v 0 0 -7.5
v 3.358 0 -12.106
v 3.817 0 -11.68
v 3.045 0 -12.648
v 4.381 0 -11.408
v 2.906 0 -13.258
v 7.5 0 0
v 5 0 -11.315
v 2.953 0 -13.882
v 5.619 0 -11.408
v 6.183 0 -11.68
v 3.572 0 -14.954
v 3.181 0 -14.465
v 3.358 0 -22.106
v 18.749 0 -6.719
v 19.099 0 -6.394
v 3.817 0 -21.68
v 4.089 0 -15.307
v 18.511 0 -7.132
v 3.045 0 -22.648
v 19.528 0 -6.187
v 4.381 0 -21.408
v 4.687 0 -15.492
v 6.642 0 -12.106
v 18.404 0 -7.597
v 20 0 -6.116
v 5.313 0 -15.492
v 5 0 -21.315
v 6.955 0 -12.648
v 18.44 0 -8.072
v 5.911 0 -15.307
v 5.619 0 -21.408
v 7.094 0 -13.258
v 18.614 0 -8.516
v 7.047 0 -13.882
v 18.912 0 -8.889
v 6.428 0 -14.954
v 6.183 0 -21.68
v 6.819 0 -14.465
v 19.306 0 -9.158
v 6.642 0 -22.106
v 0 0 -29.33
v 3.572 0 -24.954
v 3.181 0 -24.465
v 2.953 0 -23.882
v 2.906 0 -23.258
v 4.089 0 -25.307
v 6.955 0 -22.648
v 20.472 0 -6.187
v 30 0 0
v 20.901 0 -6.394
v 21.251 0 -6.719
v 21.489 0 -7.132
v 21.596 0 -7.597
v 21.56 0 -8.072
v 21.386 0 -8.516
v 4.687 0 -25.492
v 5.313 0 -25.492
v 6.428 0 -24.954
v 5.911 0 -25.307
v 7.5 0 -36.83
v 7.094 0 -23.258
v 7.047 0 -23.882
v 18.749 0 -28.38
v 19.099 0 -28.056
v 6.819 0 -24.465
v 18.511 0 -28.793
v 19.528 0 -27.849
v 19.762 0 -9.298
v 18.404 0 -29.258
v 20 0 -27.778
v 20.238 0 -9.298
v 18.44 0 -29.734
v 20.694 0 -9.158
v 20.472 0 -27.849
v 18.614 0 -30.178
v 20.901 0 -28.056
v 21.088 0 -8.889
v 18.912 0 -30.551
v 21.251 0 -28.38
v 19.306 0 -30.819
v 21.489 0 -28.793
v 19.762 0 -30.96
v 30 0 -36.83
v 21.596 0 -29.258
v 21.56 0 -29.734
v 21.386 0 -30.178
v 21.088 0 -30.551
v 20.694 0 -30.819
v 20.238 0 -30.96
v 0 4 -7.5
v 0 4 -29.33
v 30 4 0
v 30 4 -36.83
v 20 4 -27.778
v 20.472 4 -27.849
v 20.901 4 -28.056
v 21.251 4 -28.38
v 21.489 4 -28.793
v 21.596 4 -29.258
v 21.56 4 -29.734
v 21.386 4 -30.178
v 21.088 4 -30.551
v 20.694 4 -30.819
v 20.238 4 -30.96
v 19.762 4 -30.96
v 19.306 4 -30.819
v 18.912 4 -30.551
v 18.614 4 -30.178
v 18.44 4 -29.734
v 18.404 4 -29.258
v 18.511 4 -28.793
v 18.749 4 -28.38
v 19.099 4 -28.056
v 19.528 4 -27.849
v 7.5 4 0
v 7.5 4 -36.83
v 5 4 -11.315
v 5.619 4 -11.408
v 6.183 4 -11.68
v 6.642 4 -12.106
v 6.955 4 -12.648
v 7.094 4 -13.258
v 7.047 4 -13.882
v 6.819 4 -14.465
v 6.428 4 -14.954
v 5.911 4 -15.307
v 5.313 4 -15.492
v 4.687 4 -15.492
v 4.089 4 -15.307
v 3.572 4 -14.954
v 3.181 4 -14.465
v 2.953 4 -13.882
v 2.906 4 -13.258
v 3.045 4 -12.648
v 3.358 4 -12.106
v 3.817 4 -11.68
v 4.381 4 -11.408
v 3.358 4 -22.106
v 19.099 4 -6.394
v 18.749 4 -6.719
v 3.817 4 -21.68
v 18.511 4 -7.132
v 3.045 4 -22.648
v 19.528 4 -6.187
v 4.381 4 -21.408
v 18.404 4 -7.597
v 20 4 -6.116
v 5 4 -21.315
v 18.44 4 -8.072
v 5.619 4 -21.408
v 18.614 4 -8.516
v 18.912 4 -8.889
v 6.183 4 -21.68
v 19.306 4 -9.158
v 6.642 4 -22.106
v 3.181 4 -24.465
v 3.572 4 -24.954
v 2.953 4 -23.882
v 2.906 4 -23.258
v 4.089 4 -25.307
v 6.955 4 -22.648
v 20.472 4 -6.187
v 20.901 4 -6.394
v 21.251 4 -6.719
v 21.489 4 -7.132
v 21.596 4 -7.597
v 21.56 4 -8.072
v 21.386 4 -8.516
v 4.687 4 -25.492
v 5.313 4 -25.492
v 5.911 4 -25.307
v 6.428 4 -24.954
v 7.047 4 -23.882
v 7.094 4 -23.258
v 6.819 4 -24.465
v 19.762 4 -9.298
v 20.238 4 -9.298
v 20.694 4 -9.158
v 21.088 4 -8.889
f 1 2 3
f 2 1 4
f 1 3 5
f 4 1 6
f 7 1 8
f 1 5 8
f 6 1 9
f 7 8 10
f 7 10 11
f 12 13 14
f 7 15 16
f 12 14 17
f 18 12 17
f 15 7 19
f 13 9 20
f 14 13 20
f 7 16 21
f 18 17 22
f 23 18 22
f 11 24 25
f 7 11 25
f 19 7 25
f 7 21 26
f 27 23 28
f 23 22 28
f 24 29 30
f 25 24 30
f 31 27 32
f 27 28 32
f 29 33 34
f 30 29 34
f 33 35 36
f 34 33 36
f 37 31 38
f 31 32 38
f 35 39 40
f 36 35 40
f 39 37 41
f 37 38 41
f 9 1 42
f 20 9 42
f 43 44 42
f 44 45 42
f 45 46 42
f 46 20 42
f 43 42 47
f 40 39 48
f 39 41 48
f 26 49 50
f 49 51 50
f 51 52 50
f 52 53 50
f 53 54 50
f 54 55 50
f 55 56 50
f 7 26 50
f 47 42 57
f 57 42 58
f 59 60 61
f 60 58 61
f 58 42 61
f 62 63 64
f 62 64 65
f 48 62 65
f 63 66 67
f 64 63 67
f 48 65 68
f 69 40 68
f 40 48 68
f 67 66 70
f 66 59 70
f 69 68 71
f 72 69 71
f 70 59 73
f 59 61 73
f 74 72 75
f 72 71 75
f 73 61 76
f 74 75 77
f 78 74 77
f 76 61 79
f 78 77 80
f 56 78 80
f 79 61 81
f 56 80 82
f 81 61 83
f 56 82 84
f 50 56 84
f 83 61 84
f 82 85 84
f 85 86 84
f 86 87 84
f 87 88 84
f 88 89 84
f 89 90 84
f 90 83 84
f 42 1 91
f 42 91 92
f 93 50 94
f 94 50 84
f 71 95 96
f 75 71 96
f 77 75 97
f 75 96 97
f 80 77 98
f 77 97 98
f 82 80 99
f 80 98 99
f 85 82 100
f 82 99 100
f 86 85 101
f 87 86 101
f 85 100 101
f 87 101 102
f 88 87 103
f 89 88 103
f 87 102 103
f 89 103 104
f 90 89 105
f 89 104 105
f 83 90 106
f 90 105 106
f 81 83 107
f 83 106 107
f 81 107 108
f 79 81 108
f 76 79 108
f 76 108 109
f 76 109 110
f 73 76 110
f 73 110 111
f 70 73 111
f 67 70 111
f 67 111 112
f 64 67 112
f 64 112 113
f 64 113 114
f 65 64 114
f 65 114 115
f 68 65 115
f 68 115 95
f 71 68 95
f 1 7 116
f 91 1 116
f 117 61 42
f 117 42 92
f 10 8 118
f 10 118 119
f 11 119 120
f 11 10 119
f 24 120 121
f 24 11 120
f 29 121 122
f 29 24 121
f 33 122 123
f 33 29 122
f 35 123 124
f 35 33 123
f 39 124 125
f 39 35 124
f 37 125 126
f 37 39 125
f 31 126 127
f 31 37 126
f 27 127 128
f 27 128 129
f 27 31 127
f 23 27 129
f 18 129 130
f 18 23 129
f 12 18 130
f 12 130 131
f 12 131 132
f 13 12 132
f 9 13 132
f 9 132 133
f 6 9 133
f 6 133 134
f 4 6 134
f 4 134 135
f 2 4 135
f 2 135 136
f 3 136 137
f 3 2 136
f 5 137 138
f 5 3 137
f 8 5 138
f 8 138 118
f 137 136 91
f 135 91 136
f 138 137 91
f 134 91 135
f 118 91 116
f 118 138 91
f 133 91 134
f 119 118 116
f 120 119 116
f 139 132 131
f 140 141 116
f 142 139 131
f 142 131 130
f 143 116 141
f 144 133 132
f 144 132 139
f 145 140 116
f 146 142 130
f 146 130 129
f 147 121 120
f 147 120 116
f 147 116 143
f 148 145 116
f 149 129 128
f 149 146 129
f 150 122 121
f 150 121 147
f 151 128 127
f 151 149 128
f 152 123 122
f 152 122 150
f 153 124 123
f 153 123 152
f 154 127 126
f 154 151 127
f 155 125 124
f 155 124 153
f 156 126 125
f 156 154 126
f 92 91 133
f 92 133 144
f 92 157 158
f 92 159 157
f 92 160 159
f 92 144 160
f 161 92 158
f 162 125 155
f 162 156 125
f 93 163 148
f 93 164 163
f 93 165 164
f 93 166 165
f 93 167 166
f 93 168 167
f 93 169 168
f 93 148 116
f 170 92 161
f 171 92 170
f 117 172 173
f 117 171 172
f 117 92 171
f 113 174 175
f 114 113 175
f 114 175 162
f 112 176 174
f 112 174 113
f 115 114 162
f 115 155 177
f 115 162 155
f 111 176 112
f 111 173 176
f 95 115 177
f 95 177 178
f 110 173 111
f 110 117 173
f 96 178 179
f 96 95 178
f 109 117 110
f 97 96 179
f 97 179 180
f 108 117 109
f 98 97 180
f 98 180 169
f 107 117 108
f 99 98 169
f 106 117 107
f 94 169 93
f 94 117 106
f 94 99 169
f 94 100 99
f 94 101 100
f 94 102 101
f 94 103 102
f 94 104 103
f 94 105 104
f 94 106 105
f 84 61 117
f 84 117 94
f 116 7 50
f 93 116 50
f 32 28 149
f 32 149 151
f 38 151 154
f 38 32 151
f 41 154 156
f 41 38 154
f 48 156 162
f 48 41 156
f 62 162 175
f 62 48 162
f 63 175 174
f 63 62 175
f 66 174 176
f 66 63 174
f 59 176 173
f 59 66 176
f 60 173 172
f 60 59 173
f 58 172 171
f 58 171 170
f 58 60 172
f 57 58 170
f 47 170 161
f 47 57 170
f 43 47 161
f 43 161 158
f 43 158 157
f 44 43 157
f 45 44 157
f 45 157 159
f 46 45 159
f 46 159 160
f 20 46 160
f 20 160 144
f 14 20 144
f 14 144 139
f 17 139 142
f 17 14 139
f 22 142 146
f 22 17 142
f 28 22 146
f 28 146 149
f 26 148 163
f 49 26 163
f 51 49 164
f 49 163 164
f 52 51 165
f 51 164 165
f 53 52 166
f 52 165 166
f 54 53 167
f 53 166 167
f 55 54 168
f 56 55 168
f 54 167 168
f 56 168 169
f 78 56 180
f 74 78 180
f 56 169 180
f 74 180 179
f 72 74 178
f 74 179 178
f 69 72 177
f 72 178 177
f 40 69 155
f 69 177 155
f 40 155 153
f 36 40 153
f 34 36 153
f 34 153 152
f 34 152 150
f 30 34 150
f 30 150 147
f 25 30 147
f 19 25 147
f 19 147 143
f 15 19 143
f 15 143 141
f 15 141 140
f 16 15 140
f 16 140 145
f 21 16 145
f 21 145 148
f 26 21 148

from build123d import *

# Parameters (mm, degrees)
SKETCH1_W           = 30
SKETCH1_H           = 36.83
SKETCH1_R           = 2.1
BOSS_EXTRUDE1_DEPTH = 4
CHAMFER1_SIZE       = 7.5
SKETCH2_R           = 1.6
CUT_EXTRUDE1_DEPTH  = 48.670209775


with BuildPart() as part:
    # Sketch1 → Boss-Extrude1 (new body)
    with BuildSketch(Plane(origin=(0, 0, 0), x_dir=(1, 0, 0), z_dir=(0, 1, 0))):
        with Locations((15, 18.415)):
            Rectangle(SKETCH1_W, SKETCH1_H)
        with Locations(Location((5, 23.415, 0), (0, 0, 270))):
            Circle(SKETCH1_R, mode=Mode.SUBTRACT)
        with Locations(Location((5, 13.415, 0), (0, 0, 270))):
            Circle(SKETCH1_R, mode=Mode.SUBTRACT)
    extrude(amount=BOSS_EXTRUDE1_DEPTH)

    # Chamfer1
    chamfer1_edges = [part.edges().sort_by_distance(p)[0] for p in [
        (0, 2, -36.83),
        (0, 2, 0),
    ]]
    chamfer(chamfer1_edges, length=CHAMFER1_SIZE)

    # Sketch2 → Cut-Extrude1 (cut, through all)
    with BuildSketch(Plane(origin=(0, 4, 0), x_dir=(1, 0, 0), z_dir=(0, 1, 0))):
        with Locations(Location((20, 29.377825135, 0), (0, 0, 270))):
            Circle(SKETCH2_R)
        with Locations(Location((20, 7.716339326, 0), (0, 0, 270))):
            Circle(SKETCH2_R)
    extrude(amount=-CUT_EXTRUDE1_DEPTH, mode=Mode.SUBTRACT)


solid = part.part
